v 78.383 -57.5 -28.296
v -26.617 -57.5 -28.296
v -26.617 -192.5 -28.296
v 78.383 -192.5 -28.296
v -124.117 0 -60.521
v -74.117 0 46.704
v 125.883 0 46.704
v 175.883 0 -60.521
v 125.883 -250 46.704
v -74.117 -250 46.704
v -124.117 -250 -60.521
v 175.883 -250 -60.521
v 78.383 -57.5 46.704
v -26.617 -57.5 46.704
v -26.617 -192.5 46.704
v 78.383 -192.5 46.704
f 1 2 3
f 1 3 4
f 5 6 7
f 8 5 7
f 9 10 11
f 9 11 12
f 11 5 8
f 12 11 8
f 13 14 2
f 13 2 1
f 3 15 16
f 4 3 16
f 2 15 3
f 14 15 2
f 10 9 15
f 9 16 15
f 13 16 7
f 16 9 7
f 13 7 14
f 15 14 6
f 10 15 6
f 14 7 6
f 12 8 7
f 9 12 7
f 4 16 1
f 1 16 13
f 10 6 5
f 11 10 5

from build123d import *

# Parameters (mm, degrees)
F1_DEPTH = 250
F2_W     = 105
F2_H     = 135
F3_DEPTH = 75


# Not quite as in the source:
# - a feature names something its author has since deleted; it is built from what else it names


with BuildPart() as f1:
    # F0 (on Front) → F1 (new body)
    with BuildSketch(Plane.XZ):
        Polygon((-74.1169694188, 46.7042212901), (-124.1169694188, -60.5211247353), (175.8830305812, -60.5211247353), (125.8830305812, 46.7042212901), align=None)
    extrude(amount=F1_DEPTH)

    # F2 (on face) → F3 (cut)
    with BuildSketch(Plane.XY.offset(46.7042212901)):
        with Locations((25.8830305812, -125)):
            Rectangle(F2_W, F2_H)
    extrude(amount=-F3_DEPTH, mode=Mode.SUBTRACT)


solid = f1.part
